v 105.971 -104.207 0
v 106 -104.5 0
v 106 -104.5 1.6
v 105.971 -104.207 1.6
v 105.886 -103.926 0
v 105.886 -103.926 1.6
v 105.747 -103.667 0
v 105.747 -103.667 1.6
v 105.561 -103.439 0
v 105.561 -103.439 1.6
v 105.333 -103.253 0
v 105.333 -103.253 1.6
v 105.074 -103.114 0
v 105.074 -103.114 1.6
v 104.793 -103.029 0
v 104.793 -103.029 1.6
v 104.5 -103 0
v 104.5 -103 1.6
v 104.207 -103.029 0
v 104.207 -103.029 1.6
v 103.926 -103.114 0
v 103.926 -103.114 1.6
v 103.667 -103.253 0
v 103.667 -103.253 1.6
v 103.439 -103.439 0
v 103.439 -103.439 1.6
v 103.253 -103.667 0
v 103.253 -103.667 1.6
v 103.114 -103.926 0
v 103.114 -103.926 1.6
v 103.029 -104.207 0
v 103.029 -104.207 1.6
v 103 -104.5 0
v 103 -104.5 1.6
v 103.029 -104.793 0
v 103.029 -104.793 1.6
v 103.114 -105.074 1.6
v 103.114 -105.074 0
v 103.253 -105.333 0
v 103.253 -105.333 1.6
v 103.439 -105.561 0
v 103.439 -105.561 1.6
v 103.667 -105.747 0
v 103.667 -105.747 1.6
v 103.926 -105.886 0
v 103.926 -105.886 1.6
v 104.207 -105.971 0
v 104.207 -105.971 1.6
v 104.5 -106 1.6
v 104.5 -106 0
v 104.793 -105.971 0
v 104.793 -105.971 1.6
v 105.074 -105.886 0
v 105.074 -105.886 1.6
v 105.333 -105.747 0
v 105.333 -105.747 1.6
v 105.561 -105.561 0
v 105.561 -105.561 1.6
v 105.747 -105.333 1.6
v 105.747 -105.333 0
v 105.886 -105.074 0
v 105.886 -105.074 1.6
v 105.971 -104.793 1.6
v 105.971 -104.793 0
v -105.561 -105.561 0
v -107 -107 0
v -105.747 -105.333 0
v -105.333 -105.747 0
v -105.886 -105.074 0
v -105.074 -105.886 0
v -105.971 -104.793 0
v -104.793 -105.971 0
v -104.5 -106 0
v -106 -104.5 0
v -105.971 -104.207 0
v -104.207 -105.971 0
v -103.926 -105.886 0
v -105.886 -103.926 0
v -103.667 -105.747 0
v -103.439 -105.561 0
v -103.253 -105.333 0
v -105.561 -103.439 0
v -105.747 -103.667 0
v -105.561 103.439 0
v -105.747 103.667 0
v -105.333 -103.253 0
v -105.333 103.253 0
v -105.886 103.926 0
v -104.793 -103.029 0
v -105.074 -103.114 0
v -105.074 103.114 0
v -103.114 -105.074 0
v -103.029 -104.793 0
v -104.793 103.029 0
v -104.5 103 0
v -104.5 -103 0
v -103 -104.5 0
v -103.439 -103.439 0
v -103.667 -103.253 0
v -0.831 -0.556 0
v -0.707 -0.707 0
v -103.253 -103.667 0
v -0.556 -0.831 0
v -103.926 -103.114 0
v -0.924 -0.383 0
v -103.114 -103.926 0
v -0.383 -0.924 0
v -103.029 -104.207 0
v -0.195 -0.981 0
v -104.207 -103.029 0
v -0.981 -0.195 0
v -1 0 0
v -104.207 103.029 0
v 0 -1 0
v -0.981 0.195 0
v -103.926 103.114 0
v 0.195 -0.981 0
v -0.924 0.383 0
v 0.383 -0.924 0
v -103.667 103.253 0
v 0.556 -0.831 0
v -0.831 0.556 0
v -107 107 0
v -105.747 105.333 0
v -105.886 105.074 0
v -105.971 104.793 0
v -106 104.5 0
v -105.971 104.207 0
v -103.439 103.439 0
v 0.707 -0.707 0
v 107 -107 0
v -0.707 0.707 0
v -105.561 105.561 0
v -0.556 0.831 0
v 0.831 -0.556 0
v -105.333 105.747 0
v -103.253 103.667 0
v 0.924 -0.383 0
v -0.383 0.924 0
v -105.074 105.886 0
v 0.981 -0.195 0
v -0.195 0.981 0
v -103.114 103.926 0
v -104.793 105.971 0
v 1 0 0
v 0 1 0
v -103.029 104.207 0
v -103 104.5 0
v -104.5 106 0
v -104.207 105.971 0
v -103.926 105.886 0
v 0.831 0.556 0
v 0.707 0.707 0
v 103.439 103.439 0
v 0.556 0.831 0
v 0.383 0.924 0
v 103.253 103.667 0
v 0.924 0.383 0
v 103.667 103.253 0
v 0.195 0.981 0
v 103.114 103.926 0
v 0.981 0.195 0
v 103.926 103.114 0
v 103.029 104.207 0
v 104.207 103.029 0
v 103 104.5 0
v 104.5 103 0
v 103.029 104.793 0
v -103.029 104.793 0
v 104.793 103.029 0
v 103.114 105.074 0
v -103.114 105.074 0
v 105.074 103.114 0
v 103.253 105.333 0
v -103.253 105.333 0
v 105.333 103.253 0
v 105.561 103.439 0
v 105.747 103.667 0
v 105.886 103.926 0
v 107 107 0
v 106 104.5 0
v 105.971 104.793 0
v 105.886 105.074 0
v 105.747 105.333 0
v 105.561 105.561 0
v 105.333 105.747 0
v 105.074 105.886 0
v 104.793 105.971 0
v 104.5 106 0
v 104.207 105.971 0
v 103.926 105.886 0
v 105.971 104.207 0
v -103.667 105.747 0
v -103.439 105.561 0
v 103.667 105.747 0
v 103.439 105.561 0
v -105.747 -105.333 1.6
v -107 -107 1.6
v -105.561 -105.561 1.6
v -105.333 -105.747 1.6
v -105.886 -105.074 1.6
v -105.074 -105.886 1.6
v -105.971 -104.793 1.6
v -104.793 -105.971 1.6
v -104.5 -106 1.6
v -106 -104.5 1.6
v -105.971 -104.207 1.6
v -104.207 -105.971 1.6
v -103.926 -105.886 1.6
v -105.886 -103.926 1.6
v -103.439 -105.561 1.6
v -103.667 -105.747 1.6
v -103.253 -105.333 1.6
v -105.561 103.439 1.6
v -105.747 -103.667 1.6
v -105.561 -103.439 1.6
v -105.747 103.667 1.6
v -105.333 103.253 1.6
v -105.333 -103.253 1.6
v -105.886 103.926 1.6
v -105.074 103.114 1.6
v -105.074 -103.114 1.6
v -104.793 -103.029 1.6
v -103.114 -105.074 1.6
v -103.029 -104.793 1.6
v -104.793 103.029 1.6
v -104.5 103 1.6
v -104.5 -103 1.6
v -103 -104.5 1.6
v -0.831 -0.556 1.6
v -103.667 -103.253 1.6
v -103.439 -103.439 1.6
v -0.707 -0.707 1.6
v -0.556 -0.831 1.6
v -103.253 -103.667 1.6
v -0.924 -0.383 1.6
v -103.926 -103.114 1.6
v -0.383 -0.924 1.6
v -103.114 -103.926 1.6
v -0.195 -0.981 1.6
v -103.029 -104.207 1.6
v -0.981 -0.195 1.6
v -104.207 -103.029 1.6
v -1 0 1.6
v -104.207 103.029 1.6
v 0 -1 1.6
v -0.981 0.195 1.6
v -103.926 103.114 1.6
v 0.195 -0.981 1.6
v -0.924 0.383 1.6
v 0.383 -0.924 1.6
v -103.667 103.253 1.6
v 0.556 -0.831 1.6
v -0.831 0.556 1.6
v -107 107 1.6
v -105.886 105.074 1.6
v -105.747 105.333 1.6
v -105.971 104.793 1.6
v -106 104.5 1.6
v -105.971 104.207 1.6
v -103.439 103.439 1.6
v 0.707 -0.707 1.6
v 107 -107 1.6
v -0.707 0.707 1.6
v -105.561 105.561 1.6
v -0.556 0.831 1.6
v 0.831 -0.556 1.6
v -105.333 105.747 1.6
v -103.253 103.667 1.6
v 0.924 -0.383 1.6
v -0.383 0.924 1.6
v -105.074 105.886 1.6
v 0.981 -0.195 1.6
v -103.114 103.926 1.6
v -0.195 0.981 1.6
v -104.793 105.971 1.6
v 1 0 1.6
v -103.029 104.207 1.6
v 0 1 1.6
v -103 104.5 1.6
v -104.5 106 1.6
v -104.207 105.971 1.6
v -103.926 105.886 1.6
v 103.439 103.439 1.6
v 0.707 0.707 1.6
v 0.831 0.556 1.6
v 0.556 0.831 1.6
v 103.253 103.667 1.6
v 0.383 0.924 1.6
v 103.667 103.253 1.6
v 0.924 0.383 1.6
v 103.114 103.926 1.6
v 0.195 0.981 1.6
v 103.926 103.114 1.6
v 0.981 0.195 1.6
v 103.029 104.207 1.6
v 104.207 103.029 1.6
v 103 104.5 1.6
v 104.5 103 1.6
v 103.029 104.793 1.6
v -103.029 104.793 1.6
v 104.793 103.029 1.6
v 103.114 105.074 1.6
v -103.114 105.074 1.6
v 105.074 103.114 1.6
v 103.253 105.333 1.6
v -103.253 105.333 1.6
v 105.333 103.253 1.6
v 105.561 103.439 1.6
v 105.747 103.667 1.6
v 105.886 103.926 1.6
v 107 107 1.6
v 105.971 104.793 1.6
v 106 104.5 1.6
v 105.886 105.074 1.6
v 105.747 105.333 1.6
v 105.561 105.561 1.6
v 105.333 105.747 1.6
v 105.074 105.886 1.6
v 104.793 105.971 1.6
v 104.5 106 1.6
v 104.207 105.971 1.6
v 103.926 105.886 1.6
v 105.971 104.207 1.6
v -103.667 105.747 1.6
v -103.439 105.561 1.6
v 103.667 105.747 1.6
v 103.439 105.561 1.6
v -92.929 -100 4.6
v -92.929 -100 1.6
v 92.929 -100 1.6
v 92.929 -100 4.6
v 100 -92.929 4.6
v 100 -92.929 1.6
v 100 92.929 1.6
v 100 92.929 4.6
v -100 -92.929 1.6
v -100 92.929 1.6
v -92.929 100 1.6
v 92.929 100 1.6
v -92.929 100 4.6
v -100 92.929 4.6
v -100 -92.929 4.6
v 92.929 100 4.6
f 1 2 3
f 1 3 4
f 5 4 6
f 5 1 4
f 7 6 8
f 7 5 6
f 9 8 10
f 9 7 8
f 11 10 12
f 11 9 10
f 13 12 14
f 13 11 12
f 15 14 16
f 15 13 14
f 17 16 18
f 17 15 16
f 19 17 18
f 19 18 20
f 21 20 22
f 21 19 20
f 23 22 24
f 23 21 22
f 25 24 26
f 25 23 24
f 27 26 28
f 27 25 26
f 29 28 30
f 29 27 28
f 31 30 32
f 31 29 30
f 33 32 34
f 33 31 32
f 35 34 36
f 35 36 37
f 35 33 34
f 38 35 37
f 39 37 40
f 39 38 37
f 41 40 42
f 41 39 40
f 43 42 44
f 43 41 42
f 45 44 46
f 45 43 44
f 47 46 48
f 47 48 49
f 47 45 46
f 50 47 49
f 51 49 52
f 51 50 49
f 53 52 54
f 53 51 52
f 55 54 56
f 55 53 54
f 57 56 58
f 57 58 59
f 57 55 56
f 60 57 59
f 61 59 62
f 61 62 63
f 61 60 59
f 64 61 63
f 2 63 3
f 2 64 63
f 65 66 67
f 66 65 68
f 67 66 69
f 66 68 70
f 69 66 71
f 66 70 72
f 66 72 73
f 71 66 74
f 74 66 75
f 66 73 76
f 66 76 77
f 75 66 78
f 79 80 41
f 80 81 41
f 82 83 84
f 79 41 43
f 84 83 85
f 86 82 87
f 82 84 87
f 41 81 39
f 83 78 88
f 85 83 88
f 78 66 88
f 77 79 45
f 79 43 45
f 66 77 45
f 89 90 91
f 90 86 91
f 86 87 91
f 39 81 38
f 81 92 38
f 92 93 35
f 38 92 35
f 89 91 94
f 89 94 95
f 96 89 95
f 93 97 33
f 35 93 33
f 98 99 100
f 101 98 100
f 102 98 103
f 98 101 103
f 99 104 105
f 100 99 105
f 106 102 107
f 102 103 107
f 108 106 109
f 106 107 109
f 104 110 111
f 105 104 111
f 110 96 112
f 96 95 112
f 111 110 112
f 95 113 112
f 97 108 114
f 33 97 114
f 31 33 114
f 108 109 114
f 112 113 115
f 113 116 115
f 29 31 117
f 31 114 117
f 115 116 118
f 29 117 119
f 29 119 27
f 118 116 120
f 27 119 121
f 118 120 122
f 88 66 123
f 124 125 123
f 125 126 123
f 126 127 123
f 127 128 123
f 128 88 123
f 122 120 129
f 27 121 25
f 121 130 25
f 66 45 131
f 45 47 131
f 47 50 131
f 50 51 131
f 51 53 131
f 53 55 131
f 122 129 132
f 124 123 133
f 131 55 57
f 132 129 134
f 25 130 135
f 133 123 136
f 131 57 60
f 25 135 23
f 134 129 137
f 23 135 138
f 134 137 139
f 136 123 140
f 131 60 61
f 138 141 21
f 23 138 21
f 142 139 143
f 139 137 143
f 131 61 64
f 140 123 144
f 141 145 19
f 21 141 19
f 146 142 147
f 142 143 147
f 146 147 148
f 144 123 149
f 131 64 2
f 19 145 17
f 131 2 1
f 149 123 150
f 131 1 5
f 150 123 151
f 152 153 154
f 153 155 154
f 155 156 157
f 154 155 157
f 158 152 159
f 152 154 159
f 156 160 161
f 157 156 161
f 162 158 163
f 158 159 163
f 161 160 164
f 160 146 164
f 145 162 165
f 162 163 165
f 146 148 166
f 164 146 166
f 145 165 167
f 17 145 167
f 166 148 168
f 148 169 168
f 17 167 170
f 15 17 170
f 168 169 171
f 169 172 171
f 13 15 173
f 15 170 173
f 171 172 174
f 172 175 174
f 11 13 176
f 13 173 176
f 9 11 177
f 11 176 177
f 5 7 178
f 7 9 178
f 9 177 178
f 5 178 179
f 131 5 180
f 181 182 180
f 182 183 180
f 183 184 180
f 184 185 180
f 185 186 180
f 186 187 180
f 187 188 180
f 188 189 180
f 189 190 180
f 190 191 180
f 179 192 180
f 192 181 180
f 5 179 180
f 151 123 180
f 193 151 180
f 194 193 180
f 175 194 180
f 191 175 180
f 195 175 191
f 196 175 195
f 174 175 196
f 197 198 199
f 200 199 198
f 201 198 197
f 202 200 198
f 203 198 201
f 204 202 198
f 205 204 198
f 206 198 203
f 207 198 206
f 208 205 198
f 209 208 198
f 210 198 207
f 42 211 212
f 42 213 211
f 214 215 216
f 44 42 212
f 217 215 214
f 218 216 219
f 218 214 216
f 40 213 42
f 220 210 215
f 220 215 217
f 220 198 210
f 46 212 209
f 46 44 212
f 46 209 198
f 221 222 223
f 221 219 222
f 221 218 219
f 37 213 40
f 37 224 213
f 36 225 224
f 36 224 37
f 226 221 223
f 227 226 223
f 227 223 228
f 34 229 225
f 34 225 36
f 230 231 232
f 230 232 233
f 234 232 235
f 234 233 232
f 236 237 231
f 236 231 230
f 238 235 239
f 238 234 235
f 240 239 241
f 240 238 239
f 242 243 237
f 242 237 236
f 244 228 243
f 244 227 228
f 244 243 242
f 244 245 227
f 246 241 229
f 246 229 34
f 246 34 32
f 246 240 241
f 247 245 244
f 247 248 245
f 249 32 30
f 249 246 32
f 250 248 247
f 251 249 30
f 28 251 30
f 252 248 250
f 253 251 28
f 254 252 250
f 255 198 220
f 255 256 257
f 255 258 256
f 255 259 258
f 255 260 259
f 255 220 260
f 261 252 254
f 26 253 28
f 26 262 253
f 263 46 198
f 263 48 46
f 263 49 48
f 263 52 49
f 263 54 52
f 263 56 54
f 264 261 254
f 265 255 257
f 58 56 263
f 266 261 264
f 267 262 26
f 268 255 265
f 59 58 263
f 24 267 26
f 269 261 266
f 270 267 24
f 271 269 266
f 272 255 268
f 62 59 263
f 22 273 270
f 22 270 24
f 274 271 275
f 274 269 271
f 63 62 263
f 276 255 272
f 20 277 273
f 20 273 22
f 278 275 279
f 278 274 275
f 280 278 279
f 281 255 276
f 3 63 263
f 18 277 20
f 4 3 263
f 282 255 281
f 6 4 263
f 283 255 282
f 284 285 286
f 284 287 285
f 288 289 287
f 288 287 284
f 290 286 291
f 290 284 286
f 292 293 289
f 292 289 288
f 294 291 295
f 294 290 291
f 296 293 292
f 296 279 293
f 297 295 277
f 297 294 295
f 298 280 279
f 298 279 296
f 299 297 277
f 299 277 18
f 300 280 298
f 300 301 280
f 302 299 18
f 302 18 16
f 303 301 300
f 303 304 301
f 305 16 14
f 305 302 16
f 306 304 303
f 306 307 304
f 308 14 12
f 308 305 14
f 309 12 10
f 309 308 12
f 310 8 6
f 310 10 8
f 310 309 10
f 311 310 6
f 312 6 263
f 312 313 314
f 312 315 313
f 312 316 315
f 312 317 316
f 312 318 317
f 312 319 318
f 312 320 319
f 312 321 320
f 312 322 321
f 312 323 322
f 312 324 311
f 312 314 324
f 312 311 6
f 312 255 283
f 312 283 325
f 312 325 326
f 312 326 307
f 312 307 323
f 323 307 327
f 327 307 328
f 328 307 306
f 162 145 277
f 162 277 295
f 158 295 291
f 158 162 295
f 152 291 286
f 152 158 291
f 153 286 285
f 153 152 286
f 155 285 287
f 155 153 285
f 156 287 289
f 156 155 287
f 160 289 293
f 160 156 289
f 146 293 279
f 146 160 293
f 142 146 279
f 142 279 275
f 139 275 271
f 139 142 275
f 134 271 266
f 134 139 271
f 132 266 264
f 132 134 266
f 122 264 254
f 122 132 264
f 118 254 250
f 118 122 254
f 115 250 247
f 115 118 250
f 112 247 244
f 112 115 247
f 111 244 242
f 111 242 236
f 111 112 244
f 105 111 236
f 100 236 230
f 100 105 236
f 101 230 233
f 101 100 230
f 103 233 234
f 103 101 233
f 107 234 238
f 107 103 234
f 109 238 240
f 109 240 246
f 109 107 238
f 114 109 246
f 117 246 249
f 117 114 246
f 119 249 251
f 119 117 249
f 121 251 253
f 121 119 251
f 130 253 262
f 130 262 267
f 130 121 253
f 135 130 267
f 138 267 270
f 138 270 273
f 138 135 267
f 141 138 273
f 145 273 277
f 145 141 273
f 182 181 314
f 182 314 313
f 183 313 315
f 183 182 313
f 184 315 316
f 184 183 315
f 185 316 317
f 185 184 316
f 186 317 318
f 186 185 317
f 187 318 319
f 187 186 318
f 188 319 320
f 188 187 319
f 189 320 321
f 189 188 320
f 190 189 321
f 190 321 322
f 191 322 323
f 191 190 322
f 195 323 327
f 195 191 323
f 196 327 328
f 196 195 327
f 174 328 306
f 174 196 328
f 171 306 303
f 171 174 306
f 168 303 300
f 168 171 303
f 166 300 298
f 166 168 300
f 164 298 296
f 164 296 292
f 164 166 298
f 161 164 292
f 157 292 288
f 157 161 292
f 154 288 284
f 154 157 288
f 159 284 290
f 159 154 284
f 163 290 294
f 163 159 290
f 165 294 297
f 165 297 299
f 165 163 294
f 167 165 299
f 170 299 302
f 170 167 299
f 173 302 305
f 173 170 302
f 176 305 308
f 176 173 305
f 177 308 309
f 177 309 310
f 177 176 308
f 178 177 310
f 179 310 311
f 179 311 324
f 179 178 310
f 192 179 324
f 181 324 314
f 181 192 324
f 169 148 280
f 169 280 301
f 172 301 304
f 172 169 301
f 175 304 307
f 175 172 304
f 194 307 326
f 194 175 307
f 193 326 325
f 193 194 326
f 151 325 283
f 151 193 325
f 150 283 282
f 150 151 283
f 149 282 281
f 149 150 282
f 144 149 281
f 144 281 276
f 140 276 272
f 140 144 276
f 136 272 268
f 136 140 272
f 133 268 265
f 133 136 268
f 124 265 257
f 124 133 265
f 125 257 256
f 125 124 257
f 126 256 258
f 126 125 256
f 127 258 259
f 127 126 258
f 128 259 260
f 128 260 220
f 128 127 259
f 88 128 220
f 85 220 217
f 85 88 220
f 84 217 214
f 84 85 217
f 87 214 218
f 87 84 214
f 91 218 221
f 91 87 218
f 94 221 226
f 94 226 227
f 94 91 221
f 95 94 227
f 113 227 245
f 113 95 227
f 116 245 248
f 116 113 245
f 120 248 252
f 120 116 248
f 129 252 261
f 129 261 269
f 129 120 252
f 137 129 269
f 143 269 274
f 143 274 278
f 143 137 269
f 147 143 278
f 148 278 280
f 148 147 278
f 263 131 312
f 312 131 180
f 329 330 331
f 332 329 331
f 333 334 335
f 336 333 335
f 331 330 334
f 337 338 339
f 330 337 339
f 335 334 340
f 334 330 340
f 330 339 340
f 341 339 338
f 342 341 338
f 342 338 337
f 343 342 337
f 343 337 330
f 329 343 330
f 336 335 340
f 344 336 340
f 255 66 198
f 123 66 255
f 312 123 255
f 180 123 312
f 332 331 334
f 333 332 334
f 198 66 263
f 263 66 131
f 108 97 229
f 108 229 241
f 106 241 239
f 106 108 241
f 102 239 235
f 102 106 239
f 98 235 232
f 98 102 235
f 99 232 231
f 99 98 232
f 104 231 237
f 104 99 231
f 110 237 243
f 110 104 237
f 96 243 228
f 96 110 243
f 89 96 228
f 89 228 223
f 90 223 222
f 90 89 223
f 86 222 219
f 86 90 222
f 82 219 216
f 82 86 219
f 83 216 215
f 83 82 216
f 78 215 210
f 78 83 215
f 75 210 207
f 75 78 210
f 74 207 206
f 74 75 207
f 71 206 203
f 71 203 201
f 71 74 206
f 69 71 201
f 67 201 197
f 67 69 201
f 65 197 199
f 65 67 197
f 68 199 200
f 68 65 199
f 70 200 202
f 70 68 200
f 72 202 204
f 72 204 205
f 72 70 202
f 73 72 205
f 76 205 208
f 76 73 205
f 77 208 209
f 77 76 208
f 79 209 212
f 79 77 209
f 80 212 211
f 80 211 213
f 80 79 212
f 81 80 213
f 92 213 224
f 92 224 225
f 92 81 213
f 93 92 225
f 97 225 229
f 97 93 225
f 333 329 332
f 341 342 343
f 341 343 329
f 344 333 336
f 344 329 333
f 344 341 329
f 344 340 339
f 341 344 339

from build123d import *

# Parameters (mm, degrees)
F0_W     = 214
F0_H     = 214
F0_R     = 1.5
F0_R_2   = 1
F1_DEPTH = 1.6
F2_R     = 1
F3_DEPTH = 3


with BuildPart() as f1:
    # F0 (on Top) → F1 (new body)
    with BuildSketch(Plane.XY):
        Rectangle(F0_W, F0_H)
        with Locations((-104.5, -104.5)):
            Circle(F0_R, mode=Mode.SUBTRACT)
        Circle(F0_R_2, mode=Mode.SUBTRACT)
        with Locations((104.5, -104.5)):
            Circle(F0_R, mode=Mode.SUBTRACT)
        with Locations((-104.5, 104.5)):
            Circle(F0_R, mode=Mode.SUBTRACT)
        with Locations((104.5, 104.5)):
            Circle(F0_R, mode=Mode.SUBTRACT)
    extrude(amount=F1_DEPTH)


with BuildPart() as f3:
    # F2 (on face) → F3 (new body)
    with BuildSketch(Plane.XY.offset(1.6)):
        Polygon((100, 92.928932), (92.928932, 100), (-92.928932, 100), (-100, 92.928932), (-100, -92.928932), (-92.928932, -100), (92.928932, -100), (100, -92.928932), align=None)
        Circle(F2_R, mode=Mode.SUBTRACT)
        Circle(F2_R)
    extrude(amount=F3_DEPTH)


solid = Compound([f1.part, f3.part])
